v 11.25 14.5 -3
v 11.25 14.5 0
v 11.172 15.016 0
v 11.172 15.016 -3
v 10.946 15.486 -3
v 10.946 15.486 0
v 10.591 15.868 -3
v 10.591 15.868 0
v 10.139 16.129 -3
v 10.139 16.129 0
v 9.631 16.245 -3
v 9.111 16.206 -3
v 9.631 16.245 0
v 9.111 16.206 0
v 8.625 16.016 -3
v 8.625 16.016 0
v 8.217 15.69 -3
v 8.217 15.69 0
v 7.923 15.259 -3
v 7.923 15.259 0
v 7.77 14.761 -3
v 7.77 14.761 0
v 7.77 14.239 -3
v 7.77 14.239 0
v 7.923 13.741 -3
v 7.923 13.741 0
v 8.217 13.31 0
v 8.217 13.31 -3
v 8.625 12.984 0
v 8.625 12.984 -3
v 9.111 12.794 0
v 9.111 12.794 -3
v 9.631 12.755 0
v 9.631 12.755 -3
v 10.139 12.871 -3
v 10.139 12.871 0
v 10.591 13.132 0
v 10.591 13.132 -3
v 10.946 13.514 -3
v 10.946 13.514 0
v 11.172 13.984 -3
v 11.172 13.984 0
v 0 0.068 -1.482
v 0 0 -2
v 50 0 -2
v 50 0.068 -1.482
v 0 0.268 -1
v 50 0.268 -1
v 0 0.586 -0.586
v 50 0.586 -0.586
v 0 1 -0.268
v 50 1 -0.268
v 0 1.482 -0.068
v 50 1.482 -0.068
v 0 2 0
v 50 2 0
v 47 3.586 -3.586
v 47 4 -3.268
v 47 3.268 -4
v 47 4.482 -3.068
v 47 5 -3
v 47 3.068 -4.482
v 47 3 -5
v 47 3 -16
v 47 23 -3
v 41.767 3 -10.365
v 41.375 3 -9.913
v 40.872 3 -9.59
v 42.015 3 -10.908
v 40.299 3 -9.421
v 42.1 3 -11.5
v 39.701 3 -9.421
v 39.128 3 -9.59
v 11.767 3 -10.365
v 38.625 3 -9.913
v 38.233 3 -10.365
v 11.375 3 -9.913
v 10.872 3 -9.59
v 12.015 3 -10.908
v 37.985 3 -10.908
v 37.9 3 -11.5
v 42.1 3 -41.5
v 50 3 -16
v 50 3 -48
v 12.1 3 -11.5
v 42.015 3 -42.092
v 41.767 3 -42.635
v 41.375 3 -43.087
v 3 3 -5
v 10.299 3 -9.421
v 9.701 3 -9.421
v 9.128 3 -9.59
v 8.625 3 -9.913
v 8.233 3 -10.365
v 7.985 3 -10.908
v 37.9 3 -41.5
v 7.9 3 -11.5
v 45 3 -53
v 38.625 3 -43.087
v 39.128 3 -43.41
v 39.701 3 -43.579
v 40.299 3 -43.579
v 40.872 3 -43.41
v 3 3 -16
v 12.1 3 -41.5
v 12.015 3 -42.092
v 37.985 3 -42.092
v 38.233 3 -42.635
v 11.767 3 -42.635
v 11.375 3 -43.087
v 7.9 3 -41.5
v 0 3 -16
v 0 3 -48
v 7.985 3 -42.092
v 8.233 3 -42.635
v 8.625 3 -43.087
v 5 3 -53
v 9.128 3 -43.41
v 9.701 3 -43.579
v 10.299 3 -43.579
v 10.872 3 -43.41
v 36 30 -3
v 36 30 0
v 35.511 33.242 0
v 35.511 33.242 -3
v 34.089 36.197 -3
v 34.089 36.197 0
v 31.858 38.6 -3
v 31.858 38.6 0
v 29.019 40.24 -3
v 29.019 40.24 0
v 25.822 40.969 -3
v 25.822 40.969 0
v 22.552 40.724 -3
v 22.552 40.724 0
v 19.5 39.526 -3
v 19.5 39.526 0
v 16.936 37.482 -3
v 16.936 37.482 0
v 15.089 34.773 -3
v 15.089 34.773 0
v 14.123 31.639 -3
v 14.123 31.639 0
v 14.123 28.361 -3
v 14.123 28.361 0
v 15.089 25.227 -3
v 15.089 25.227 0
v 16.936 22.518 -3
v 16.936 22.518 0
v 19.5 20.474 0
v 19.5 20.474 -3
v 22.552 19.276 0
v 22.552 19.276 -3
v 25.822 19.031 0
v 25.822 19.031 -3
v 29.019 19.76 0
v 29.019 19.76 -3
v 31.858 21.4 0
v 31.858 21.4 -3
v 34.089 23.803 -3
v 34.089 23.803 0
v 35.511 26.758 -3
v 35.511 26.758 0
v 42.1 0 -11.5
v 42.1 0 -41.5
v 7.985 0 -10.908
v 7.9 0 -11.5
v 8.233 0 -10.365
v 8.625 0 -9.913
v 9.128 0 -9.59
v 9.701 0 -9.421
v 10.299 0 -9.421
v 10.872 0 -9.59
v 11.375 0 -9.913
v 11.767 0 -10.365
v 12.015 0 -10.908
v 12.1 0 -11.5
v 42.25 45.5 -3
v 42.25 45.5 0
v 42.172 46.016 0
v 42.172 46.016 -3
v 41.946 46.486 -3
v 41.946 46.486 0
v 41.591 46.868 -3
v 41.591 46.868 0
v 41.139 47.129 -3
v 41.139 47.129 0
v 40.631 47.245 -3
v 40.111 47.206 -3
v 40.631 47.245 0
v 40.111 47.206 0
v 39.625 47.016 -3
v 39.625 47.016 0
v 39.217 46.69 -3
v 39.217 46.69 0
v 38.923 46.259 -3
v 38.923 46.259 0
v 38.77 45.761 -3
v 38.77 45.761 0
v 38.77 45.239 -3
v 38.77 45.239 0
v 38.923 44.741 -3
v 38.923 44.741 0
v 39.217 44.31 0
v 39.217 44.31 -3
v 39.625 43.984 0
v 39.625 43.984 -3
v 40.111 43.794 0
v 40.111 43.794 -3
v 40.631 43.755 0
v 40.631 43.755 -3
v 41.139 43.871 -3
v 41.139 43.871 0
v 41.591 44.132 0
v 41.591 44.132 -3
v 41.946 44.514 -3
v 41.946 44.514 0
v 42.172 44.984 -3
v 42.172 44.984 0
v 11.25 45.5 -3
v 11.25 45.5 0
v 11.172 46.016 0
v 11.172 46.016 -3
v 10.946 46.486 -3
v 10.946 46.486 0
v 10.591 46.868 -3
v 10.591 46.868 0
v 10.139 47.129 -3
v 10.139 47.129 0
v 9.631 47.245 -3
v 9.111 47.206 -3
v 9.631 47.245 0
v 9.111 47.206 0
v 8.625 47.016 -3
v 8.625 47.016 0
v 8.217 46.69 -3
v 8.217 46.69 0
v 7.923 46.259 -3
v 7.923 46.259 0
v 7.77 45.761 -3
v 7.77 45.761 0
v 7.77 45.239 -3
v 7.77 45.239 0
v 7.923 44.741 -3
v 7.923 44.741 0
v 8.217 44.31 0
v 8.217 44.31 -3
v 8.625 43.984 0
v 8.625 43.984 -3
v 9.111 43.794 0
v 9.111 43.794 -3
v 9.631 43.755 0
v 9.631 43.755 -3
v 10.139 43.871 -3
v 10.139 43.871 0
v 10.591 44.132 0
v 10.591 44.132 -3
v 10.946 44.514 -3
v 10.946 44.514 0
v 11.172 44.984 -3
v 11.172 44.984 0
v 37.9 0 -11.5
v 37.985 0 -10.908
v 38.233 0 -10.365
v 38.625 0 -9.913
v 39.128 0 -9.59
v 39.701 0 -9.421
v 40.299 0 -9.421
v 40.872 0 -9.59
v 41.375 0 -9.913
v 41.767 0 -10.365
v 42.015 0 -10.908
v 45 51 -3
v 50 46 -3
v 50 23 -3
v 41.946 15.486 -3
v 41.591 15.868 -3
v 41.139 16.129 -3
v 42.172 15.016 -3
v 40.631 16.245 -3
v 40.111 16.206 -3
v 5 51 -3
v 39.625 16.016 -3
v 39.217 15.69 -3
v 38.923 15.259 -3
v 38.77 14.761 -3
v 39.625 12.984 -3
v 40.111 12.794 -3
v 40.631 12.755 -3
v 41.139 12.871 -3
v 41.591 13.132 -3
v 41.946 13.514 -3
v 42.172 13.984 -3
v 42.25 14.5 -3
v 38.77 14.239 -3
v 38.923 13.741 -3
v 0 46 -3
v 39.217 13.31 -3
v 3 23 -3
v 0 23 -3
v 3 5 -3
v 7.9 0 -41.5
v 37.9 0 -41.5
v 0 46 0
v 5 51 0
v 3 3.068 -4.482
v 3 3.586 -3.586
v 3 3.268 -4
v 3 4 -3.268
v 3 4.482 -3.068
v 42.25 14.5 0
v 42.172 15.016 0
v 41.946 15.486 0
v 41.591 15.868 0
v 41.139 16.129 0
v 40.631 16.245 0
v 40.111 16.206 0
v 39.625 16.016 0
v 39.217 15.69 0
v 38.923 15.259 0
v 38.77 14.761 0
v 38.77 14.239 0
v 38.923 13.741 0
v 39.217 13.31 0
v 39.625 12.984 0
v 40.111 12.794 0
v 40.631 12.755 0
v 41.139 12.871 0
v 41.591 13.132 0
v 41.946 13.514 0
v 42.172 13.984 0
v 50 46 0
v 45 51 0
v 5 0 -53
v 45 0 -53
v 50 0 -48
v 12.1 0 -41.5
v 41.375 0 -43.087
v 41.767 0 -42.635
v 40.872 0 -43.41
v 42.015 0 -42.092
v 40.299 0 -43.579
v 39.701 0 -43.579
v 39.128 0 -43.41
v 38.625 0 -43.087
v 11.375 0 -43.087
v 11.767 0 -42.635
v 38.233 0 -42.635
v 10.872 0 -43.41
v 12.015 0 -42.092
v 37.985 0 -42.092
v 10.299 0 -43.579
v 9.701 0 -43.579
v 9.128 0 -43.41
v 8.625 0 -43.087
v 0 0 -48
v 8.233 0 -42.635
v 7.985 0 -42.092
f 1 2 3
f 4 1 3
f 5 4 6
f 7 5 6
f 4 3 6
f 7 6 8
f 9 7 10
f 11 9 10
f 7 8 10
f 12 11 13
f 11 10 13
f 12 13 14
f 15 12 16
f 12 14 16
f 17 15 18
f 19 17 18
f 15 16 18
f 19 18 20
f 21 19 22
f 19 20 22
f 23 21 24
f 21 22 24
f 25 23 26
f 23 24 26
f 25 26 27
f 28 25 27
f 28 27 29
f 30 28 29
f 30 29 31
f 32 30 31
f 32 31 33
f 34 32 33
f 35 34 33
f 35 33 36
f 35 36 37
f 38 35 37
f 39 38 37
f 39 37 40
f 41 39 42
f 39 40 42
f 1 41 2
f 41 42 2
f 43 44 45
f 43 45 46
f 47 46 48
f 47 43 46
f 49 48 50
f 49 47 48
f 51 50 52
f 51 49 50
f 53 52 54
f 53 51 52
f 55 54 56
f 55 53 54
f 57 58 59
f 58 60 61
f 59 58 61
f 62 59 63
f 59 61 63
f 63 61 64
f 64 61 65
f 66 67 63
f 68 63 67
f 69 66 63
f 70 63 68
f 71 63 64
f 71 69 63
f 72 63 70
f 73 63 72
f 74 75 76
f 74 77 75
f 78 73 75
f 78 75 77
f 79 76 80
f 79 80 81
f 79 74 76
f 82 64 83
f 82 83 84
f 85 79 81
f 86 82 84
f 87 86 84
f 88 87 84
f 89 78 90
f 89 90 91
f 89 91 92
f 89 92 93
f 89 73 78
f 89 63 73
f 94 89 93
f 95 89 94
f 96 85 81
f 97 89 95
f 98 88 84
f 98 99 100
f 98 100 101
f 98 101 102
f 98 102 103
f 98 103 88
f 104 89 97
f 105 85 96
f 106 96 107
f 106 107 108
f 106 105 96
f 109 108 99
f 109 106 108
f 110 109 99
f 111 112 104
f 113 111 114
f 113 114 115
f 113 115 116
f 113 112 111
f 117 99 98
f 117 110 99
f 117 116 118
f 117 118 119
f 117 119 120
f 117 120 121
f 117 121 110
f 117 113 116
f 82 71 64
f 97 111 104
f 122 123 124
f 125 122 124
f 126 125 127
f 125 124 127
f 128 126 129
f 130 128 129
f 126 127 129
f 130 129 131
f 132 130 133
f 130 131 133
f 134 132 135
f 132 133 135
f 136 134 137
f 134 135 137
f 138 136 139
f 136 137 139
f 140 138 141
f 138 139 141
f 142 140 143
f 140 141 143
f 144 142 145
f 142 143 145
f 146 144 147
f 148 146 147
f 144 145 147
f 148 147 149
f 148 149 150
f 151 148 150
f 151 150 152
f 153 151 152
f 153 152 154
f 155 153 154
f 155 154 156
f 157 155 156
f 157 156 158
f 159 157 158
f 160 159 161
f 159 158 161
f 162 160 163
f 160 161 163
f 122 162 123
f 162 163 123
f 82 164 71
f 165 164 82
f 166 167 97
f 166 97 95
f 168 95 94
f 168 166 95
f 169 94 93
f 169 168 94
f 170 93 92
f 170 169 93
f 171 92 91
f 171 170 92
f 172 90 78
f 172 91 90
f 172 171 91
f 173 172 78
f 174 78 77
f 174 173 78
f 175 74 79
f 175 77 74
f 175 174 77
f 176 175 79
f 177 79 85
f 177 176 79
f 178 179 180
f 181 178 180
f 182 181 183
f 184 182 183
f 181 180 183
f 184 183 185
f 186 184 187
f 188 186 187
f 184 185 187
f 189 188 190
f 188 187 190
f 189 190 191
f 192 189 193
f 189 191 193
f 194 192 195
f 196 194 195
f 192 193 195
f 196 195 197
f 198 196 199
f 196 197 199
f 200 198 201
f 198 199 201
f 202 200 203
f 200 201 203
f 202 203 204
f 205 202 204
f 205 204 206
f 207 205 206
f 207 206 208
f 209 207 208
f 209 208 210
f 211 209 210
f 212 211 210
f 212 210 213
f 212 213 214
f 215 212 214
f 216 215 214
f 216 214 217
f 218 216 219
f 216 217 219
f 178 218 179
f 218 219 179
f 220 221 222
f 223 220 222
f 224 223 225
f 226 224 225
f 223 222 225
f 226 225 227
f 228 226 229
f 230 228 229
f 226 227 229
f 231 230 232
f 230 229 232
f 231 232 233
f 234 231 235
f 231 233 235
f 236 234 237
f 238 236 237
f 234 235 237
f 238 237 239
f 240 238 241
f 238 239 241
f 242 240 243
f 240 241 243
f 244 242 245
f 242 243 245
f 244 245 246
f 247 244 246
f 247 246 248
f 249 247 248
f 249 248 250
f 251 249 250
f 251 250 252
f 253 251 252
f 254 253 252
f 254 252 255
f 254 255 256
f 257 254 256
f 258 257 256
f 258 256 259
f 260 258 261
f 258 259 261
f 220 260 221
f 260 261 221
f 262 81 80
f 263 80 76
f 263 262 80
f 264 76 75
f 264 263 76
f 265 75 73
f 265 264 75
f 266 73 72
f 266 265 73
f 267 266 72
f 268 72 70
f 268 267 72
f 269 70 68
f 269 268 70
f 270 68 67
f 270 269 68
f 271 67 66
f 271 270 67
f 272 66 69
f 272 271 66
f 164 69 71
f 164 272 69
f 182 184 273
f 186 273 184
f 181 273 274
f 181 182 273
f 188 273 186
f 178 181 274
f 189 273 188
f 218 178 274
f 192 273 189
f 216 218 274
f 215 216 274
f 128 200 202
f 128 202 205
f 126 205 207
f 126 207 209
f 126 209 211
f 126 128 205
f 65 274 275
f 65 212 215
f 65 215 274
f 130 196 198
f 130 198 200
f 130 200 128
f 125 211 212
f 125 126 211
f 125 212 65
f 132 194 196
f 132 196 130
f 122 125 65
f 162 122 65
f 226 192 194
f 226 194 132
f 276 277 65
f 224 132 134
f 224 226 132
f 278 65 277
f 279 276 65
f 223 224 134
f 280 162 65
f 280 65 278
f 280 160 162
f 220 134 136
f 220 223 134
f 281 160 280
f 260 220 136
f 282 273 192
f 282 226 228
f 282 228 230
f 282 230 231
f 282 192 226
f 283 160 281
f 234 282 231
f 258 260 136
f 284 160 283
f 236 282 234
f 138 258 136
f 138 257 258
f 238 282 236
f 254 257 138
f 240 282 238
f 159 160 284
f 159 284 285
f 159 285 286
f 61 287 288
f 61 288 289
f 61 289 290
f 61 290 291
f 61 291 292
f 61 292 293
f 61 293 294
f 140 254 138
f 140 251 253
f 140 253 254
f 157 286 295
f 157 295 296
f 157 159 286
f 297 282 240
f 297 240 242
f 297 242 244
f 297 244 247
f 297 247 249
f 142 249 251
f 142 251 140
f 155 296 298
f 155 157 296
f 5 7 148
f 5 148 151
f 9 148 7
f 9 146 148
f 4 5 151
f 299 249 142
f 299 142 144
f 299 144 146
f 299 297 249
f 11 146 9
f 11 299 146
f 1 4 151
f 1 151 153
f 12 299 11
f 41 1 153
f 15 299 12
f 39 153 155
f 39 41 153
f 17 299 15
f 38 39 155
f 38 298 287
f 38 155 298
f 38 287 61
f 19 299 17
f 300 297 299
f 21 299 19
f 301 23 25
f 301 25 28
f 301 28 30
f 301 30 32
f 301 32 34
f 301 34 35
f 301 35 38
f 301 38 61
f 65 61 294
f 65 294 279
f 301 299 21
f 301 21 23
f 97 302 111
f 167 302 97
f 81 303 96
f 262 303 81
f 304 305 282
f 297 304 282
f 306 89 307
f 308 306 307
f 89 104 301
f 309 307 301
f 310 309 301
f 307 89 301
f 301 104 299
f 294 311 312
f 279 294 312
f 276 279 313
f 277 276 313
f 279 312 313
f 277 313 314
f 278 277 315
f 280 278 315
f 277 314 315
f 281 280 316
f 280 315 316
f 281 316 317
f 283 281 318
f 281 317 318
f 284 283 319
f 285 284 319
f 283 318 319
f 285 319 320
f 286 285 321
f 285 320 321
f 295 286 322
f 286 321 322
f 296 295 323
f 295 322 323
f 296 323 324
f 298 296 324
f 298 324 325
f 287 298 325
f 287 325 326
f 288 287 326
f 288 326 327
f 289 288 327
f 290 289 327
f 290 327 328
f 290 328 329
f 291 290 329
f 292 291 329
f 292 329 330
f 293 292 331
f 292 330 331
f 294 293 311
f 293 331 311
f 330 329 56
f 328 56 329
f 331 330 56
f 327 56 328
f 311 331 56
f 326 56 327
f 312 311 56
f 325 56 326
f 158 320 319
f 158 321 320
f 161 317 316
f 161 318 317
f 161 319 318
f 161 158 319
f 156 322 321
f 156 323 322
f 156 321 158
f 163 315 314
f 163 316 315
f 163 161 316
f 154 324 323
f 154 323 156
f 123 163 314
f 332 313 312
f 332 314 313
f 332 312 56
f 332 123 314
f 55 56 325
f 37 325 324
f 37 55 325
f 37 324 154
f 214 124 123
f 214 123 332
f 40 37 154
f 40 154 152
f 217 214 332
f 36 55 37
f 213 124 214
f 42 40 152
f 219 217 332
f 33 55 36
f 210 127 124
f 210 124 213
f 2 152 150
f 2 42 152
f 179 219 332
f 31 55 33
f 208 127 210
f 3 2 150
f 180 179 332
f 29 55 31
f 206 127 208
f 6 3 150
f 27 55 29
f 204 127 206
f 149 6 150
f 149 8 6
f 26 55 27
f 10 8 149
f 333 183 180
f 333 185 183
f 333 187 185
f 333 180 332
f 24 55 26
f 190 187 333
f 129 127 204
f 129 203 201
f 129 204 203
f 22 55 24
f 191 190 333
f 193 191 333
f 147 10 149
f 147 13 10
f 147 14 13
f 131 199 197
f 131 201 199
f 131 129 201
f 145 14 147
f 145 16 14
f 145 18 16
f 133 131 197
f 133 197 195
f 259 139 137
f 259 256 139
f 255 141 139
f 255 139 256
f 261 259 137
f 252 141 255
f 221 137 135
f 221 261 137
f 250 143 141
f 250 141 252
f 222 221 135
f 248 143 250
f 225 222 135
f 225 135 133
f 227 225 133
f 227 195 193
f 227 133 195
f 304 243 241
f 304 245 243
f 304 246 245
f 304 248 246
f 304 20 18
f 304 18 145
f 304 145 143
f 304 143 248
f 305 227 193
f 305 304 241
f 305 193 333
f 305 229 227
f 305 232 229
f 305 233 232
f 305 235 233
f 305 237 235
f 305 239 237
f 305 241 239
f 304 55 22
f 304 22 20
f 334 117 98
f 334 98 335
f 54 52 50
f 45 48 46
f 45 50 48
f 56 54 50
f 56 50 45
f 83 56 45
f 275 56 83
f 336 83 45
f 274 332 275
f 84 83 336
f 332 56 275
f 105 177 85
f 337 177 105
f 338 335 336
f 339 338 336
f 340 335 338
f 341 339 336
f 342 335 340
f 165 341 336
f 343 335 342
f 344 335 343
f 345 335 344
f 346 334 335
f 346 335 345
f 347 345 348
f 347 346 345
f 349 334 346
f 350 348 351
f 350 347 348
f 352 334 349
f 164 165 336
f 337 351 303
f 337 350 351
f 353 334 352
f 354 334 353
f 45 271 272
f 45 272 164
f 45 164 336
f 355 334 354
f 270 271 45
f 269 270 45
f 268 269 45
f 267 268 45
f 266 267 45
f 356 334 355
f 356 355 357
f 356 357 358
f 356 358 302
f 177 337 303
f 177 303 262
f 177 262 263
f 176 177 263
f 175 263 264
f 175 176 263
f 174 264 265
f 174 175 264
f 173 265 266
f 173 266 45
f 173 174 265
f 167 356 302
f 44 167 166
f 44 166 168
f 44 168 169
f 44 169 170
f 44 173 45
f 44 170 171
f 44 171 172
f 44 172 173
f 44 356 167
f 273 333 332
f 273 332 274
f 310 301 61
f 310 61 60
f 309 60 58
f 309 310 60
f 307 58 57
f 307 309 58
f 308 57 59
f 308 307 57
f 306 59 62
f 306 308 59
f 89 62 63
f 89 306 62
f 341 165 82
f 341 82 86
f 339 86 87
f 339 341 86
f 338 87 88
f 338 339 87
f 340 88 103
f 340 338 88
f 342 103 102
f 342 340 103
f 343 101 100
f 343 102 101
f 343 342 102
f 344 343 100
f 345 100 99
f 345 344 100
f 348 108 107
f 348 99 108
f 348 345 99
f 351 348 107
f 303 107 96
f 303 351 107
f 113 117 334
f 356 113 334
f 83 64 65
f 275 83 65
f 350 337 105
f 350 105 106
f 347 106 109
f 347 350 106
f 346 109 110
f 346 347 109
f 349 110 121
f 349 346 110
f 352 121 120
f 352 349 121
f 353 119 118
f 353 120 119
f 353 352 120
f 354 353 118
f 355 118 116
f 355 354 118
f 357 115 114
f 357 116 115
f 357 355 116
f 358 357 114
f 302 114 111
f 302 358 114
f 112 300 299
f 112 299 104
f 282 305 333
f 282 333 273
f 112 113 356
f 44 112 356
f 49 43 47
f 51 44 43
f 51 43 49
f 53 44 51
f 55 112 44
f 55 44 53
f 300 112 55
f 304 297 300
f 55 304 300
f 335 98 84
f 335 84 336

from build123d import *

# Parameters (mm, degrees)
EXTRUDE_1_DEPTH     = 50
EXTRUDE_2_DEPTH     = 3
EXTRUDE_START       = -3
EXTRUDE_3_DEPTH     = 3
SKETCH_5_R          = 11
SKETCH_5_R_2        = 1.75
CUT_EXTRUDE_1_DEPTH = 3
CUT_EXTRUDE_2_DEPTH = 11
CHAMFER_1_SIZE      = 5


with BuildPart() as part:
    # 草图1 → 凸台-拉伸1 (new body)
    with BuildSketch(Plane(origin=(0, 0, 0), x_dir=(0, 0, -1), z_dir=(1, 0, 0))):
        with BuildLine():
            Line((0, 2), (0, 51))
            Line((0, 51), (3, 51))
            Line((3, 51), (3, 5))
            ThreePointArc((3, 5), (3.585786438, 3.585786438), (5, 3))
            Line((5, 3), (53, 3))
            Line((53, 3), (53, 0))
            Line((53, 0), (2, 0))
            ThreePointArc((2, 0), (0.585786438, 0.585786438), (0, 2))
        make_face()
    extrude(amount=EXTRUDE_1_DEPTH)

    # 草图3 → 凸台-拉伸2 (add)
    with BuildSketch(Plane(origin=(0, 0, 0), x_dir=(0, 0, -1), z_dir=(1, 0, 0))):
        with BuildLine():
            Line((3, 5), (3, 23))
            Line((3, 23), (16, 3))
            Line((16, 3), (5, 3))
            ThreePointArc((5, 3), (3.585786438, 3.585786438), (3, 5))
        make_face()
    extrude(amount=EXTRUDE_2_DEPTH)

    # 草图4 → 凸台-拉伸3 (add)
    with BuildSketch(Plane(origin=(50, 0, 0), x_dir=(0, 0, -1), z_dir=(1, 0, 0)).offset(EXTRUDE_START)):
        with BuildLine():
            Line((3, 23), (3, 5))
            ThreePointArc((3, 5), (3.585786438, 3.585786438), (5, 3))
            Line((5, 3), (16, 3))
            Line((16, 3), (3, 23))
        make_face()
    extrude(amount=EXTRUDE_3_DEPTH)

    # 草图5 → 切除-拉伸1 (cut)
    with BuildSketch(Plane.XY):
        with Locations((25, 30)):
            Circle(SKETCH_5_R)
        with Locations((9.5, 45.5)):
            Circle(SKETCH_5_R_2)
        with Locations((40.5, 45.5)):
            Circle(SKETCH_5_R_2)
        with Locations((9.5, 14.5)):
            Circle(SKETCH_5_R_2)
        with Locations((40.5, 14.5)):
            Circle(SKETCH_5_R_2)
    extrude(amount=-CUT_EXTRUDE_1_DEPTH, mode=Mode.SUBTRACT)

    # 草图6 → 切除-拉伸2 (cut)
    with BuildSketch(Plane(origin=(0, 0, 0), x_dir=(1, 0, 0), z_dir=(0, 1, 0))):
        with BuildLine():
            Line((7.9, 41.5), (7.9, 11.5))
            ThreePointArc((7.9, 11.5), (10, 9.4), (12.1, 11.5))
            Line((12.1, 11.5), (12.1, 41.5))
            ThreePointArc((12.1, 41.5), (10, 43.6), (7.9, 41.5))
        make_face()
        with BuildLine():
            Line((37.9, 41.5), (37.9, 11.5))
            ThreePointArc((37.9, 11.5), (40, 9.4), (42.1, 11.5))
            Line((42.1, 11.5), (42.1, 41.5))
            ThreePointArc((42.1, 41.5), (40, 43.6), (37.9, 41.5))
        make_face()
    extrude(amount=CUT_EXTRUDE_2_DEPTH, mode=Mode.SUBTRACT)

    # 倒角1
    chamfer_1_edges = [part.edges().sort_by_distance(p)[0] for p in [
        (0, 51, -1.5),
        (50, 1.5, -53),
        (50, 51, -1.5),
        (0, 1.5, -53),
    ]]
    chamfer(chamfer_1_edges, length=CHAMFER_1_SIZE)


solid = part.part
